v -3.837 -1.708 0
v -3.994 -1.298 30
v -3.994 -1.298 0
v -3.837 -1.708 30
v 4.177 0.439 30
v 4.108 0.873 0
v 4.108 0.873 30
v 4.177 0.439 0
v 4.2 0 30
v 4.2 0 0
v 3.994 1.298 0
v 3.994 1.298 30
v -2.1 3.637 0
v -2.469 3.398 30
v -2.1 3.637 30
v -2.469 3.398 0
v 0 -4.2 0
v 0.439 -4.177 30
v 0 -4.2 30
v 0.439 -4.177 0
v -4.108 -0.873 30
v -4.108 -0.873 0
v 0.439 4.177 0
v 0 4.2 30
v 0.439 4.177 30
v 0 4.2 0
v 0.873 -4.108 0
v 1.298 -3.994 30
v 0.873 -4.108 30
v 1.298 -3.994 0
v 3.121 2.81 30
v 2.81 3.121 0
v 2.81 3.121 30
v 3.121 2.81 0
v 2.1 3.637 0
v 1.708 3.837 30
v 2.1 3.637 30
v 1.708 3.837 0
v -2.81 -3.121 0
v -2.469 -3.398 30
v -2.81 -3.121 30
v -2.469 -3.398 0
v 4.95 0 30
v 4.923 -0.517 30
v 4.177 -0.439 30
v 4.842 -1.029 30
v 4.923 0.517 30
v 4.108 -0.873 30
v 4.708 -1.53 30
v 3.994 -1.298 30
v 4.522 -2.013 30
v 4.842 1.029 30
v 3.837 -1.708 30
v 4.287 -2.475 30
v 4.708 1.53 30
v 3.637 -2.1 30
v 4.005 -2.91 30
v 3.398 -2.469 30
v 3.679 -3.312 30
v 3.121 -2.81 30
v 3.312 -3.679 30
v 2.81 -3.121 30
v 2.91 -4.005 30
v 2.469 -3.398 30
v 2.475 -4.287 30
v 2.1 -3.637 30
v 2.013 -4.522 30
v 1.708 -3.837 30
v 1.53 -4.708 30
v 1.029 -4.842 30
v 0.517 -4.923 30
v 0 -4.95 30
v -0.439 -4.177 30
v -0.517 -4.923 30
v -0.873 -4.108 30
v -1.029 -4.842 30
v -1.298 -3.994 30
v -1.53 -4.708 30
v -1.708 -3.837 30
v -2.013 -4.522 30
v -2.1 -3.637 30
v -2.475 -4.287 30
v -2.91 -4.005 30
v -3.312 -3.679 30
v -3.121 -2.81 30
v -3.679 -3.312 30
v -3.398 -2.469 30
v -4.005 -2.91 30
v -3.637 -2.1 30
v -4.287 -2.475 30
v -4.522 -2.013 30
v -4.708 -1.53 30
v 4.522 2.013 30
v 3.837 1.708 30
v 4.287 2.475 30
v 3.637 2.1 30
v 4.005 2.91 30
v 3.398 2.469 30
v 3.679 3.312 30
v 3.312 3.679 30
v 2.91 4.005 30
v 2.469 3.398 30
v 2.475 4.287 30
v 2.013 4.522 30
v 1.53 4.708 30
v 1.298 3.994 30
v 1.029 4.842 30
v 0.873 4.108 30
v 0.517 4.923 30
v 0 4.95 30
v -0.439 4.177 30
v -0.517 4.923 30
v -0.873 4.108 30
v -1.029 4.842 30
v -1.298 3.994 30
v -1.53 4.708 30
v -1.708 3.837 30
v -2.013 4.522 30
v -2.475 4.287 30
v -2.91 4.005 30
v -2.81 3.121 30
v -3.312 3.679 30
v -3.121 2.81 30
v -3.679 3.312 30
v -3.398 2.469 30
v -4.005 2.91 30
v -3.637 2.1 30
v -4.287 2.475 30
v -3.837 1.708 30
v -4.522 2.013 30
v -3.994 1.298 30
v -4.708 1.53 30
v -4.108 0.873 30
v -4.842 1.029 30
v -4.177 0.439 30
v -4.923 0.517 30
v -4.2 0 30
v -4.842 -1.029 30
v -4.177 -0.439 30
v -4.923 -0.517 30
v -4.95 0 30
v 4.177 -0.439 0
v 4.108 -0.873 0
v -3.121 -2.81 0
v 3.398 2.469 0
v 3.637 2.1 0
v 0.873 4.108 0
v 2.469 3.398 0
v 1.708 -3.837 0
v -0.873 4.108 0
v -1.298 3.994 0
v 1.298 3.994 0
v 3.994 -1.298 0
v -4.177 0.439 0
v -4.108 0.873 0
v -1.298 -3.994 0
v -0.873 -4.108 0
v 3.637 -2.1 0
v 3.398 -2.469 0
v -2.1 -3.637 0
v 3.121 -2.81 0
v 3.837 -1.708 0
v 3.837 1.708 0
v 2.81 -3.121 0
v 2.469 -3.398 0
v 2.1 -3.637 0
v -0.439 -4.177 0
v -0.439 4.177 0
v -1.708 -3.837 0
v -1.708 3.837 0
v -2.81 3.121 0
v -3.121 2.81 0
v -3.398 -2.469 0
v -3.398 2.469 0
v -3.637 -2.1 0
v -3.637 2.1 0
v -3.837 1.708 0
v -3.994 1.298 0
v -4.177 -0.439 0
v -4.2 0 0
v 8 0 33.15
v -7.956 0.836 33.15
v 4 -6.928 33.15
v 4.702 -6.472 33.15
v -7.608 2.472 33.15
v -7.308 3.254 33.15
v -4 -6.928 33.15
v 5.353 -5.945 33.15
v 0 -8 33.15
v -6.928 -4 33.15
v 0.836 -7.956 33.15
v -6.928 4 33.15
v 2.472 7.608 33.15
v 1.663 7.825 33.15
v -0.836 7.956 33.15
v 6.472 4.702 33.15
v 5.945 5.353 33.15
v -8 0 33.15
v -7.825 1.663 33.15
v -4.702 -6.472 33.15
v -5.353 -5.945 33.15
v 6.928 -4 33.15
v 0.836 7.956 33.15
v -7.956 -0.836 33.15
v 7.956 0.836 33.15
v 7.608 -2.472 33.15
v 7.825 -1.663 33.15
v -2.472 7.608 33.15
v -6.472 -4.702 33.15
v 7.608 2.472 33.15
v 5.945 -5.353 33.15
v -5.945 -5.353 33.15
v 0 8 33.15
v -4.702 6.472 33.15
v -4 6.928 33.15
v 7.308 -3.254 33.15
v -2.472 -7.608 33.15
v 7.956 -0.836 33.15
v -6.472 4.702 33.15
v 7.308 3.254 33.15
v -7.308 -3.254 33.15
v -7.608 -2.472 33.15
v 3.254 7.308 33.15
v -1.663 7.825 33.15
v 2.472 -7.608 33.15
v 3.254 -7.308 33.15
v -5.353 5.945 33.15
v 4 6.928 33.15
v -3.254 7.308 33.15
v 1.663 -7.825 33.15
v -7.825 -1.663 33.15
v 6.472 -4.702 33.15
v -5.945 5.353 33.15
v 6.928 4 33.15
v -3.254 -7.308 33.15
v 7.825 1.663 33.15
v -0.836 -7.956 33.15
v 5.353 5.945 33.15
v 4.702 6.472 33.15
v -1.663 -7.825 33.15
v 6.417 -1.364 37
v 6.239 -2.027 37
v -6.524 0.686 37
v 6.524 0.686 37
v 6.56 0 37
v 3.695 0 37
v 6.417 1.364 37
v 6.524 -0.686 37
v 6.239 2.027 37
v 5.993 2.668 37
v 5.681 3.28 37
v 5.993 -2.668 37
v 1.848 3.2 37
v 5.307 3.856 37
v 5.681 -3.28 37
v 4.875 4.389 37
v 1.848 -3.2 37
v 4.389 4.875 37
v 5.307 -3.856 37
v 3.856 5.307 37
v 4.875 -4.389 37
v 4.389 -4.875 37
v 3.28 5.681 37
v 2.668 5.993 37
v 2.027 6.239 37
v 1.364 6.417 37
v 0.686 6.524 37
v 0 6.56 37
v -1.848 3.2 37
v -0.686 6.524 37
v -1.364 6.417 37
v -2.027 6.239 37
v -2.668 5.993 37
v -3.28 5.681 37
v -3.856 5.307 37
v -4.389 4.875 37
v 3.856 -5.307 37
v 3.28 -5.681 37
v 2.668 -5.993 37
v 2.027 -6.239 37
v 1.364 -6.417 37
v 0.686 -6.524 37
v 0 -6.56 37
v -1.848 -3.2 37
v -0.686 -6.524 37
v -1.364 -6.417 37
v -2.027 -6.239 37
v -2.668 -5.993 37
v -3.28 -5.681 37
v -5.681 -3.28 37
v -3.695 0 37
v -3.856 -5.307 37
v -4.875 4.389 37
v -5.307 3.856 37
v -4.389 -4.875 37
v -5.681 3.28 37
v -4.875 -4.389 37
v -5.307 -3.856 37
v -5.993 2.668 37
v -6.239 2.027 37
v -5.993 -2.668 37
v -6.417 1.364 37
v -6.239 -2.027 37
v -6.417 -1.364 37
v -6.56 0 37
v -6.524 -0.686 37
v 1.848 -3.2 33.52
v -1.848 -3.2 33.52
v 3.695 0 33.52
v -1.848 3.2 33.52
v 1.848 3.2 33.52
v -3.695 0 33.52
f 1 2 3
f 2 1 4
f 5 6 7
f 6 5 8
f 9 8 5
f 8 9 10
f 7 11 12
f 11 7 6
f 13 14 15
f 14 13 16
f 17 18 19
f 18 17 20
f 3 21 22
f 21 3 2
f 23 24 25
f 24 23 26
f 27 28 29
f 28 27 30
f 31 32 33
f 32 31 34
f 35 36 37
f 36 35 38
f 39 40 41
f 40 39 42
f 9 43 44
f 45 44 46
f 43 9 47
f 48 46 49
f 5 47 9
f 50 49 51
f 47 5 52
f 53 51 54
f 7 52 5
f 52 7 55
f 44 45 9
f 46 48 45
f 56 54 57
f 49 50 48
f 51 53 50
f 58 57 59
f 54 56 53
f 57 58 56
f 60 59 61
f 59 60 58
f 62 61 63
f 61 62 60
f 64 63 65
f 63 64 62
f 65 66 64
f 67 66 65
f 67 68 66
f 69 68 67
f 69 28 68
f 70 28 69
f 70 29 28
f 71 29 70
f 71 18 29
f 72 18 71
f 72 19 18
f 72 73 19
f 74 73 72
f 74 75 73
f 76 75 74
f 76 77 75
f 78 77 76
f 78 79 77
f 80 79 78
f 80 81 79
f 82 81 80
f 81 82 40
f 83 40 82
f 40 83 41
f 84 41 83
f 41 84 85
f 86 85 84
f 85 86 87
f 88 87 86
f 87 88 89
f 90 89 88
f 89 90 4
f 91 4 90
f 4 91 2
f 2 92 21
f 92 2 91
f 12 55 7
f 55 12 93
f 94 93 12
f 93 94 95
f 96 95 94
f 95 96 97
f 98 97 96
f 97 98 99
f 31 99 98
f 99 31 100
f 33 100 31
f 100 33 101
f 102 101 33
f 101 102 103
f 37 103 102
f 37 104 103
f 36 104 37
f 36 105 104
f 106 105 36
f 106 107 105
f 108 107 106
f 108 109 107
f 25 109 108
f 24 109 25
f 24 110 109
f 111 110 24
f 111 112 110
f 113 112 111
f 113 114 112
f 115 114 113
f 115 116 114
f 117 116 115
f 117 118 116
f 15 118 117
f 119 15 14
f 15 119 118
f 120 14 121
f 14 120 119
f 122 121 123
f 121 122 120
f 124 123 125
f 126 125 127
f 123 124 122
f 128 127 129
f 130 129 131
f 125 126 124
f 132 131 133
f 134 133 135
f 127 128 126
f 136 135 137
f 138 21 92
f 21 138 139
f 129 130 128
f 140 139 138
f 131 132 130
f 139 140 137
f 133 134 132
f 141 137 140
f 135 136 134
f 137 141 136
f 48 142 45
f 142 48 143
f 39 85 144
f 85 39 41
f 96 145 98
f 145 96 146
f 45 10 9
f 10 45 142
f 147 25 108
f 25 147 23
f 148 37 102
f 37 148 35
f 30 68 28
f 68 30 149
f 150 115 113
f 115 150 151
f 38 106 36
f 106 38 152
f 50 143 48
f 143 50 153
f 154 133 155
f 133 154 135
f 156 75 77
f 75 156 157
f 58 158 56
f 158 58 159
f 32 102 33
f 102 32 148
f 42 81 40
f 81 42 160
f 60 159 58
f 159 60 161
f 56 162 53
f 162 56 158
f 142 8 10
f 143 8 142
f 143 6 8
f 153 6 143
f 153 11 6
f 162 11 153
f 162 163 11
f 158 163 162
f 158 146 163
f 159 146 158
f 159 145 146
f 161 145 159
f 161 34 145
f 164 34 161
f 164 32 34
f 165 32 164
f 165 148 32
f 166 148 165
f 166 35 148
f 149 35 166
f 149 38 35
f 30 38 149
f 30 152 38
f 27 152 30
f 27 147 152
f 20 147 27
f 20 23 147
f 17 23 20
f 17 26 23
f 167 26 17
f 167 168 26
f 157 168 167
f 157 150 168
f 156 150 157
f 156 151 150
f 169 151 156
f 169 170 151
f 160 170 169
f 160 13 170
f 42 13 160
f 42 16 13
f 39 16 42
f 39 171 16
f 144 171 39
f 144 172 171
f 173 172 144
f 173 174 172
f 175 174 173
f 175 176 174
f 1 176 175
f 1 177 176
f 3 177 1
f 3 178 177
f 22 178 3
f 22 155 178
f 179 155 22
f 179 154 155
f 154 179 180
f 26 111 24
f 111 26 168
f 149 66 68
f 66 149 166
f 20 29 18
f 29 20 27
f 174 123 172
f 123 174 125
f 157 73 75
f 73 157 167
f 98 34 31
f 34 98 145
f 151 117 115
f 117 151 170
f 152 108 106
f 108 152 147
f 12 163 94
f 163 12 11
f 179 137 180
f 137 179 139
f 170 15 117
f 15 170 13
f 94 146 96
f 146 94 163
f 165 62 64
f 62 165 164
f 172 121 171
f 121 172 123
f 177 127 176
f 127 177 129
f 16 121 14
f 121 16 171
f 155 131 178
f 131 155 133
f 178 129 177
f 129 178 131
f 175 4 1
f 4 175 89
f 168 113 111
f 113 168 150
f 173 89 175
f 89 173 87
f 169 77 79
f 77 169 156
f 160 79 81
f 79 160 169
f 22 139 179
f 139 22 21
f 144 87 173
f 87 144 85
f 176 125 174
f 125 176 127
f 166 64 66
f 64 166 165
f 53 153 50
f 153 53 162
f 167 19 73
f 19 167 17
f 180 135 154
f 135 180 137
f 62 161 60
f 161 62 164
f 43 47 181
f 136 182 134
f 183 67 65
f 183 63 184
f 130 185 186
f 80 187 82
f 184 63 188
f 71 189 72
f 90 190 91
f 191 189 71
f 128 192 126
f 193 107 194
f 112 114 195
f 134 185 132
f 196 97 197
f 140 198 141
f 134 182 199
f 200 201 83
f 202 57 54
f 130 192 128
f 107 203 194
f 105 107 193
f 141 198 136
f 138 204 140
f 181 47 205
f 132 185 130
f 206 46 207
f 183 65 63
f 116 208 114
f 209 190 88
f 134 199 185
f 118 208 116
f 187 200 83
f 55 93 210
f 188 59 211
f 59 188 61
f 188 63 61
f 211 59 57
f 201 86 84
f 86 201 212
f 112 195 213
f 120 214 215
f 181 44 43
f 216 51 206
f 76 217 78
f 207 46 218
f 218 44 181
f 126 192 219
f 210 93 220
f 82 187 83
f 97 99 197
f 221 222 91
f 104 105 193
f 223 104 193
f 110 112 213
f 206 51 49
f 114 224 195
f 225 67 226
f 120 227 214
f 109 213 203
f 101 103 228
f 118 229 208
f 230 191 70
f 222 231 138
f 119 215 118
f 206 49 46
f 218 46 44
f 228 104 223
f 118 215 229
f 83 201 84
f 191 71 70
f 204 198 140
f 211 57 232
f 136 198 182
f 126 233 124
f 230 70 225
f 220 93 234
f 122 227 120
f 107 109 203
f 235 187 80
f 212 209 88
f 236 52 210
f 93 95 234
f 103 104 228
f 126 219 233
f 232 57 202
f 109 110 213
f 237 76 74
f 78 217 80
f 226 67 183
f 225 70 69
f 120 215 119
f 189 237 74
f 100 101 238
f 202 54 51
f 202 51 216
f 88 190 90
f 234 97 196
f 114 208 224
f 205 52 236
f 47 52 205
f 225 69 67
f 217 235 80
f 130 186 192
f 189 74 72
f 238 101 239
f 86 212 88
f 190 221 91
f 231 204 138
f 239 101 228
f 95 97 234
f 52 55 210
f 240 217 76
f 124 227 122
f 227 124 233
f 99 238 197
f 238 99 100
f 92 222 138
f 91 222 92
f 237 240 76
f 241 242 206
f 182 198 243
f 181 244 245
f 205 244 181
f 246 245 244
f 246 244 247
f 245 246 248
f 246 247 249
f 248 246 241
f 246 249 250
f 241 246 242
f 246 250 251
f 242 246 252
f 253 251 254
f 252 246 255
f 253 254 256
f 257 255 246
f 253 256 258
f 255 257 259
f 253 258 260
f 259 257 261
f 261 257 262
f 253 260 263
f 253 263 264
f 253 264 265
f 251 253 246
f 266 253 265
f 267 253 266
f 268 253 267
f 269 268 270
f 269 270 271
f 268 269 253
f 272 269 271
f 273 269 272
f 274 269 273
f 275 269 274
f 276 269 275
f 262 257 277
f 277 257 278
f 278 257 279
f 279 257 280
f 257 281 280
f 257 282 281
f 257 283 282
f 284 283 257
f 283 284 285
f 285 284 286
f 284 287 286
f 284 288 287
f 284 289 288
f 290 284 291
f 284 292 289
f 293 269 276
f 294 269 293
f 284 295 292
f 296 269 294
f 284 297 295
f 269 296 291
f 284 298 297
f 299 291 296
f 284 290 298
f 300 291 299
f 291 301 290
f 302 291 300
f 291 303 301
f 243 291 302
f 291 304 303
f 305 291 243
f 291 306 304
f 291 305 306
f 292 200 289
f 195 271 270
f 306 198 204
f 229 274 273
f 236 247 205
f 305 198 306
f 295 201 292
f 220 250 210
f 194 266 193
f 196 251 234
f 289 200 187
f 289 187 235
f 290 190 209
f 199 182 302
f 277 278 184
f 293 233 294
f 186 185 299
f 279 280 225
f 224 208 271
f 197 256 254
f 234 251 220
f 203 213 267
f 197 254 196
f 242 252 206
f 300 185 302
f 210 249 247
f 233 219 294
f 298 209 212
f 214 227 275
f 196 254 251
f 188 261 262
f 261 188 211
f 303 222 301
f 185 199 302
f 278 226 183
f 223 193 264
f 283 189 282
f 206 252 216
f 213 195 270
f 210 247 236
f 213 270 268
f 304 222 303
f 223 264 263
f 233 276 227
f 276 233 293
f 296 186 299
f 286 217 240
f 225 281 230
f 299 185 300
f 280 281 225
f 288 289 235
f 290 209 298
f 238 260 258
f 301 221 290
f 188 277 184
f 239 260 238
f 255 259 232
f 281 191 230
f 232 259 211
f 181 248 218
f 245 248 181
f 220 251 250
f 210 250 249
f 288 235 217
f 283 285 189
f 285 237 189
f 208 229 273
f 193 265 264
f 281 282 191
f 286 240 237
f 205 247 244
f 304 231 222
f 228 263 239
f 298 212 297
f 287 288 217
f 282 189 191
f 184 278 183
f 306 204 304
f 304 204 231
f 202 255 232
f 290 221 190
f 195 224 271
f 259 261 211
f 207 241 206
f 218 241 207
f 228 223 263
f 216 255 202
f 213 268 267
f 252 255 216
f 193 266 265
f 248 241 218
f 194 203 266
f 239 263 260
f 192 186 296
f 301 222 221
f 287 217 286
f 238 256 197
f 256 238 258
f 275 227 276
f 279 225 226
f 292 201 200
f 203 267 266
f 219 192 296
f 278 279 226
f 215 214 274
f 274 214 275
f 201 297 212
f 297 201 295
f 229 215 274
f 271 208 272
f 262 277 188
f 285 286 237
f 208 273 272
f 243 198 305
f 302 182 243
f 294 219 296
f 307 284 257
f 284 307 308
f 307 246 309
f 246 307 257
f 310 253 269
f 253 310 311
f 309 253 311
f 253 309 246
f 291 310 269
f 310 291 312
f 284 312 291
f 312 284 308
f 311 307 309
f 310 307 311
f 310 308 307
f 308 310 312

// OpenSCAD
// Low-profile button-head screw.
$fn = 60;
eps = 0.02;
shaft_d = 8.4;
head_d = 16;
head_h = 7;
shaft_l = 30;
socket_flat = head_d * 0.40;
difference() {
    union() {
        cylinder(d = shaft_d, h = shaft_l);
        translate([0, 0, shaft_l]) cylinder(d1 = shaft_d + 1.5, d2 = head_d, h = head_h * 0.45);
        translate([0, 0, shaft_l + head_h * 0.45]) cylinder(d1 = head_d, d2 = head_d * 0.82, h = head_h * 0.55);
    }
    translate([0, 0, shaft_l + head_h - head_h * 0.5 + eps])
        cylinder(d = socket_flat / cos(30), h = head_h * 0.5 + eps, $fn = 6);
}
